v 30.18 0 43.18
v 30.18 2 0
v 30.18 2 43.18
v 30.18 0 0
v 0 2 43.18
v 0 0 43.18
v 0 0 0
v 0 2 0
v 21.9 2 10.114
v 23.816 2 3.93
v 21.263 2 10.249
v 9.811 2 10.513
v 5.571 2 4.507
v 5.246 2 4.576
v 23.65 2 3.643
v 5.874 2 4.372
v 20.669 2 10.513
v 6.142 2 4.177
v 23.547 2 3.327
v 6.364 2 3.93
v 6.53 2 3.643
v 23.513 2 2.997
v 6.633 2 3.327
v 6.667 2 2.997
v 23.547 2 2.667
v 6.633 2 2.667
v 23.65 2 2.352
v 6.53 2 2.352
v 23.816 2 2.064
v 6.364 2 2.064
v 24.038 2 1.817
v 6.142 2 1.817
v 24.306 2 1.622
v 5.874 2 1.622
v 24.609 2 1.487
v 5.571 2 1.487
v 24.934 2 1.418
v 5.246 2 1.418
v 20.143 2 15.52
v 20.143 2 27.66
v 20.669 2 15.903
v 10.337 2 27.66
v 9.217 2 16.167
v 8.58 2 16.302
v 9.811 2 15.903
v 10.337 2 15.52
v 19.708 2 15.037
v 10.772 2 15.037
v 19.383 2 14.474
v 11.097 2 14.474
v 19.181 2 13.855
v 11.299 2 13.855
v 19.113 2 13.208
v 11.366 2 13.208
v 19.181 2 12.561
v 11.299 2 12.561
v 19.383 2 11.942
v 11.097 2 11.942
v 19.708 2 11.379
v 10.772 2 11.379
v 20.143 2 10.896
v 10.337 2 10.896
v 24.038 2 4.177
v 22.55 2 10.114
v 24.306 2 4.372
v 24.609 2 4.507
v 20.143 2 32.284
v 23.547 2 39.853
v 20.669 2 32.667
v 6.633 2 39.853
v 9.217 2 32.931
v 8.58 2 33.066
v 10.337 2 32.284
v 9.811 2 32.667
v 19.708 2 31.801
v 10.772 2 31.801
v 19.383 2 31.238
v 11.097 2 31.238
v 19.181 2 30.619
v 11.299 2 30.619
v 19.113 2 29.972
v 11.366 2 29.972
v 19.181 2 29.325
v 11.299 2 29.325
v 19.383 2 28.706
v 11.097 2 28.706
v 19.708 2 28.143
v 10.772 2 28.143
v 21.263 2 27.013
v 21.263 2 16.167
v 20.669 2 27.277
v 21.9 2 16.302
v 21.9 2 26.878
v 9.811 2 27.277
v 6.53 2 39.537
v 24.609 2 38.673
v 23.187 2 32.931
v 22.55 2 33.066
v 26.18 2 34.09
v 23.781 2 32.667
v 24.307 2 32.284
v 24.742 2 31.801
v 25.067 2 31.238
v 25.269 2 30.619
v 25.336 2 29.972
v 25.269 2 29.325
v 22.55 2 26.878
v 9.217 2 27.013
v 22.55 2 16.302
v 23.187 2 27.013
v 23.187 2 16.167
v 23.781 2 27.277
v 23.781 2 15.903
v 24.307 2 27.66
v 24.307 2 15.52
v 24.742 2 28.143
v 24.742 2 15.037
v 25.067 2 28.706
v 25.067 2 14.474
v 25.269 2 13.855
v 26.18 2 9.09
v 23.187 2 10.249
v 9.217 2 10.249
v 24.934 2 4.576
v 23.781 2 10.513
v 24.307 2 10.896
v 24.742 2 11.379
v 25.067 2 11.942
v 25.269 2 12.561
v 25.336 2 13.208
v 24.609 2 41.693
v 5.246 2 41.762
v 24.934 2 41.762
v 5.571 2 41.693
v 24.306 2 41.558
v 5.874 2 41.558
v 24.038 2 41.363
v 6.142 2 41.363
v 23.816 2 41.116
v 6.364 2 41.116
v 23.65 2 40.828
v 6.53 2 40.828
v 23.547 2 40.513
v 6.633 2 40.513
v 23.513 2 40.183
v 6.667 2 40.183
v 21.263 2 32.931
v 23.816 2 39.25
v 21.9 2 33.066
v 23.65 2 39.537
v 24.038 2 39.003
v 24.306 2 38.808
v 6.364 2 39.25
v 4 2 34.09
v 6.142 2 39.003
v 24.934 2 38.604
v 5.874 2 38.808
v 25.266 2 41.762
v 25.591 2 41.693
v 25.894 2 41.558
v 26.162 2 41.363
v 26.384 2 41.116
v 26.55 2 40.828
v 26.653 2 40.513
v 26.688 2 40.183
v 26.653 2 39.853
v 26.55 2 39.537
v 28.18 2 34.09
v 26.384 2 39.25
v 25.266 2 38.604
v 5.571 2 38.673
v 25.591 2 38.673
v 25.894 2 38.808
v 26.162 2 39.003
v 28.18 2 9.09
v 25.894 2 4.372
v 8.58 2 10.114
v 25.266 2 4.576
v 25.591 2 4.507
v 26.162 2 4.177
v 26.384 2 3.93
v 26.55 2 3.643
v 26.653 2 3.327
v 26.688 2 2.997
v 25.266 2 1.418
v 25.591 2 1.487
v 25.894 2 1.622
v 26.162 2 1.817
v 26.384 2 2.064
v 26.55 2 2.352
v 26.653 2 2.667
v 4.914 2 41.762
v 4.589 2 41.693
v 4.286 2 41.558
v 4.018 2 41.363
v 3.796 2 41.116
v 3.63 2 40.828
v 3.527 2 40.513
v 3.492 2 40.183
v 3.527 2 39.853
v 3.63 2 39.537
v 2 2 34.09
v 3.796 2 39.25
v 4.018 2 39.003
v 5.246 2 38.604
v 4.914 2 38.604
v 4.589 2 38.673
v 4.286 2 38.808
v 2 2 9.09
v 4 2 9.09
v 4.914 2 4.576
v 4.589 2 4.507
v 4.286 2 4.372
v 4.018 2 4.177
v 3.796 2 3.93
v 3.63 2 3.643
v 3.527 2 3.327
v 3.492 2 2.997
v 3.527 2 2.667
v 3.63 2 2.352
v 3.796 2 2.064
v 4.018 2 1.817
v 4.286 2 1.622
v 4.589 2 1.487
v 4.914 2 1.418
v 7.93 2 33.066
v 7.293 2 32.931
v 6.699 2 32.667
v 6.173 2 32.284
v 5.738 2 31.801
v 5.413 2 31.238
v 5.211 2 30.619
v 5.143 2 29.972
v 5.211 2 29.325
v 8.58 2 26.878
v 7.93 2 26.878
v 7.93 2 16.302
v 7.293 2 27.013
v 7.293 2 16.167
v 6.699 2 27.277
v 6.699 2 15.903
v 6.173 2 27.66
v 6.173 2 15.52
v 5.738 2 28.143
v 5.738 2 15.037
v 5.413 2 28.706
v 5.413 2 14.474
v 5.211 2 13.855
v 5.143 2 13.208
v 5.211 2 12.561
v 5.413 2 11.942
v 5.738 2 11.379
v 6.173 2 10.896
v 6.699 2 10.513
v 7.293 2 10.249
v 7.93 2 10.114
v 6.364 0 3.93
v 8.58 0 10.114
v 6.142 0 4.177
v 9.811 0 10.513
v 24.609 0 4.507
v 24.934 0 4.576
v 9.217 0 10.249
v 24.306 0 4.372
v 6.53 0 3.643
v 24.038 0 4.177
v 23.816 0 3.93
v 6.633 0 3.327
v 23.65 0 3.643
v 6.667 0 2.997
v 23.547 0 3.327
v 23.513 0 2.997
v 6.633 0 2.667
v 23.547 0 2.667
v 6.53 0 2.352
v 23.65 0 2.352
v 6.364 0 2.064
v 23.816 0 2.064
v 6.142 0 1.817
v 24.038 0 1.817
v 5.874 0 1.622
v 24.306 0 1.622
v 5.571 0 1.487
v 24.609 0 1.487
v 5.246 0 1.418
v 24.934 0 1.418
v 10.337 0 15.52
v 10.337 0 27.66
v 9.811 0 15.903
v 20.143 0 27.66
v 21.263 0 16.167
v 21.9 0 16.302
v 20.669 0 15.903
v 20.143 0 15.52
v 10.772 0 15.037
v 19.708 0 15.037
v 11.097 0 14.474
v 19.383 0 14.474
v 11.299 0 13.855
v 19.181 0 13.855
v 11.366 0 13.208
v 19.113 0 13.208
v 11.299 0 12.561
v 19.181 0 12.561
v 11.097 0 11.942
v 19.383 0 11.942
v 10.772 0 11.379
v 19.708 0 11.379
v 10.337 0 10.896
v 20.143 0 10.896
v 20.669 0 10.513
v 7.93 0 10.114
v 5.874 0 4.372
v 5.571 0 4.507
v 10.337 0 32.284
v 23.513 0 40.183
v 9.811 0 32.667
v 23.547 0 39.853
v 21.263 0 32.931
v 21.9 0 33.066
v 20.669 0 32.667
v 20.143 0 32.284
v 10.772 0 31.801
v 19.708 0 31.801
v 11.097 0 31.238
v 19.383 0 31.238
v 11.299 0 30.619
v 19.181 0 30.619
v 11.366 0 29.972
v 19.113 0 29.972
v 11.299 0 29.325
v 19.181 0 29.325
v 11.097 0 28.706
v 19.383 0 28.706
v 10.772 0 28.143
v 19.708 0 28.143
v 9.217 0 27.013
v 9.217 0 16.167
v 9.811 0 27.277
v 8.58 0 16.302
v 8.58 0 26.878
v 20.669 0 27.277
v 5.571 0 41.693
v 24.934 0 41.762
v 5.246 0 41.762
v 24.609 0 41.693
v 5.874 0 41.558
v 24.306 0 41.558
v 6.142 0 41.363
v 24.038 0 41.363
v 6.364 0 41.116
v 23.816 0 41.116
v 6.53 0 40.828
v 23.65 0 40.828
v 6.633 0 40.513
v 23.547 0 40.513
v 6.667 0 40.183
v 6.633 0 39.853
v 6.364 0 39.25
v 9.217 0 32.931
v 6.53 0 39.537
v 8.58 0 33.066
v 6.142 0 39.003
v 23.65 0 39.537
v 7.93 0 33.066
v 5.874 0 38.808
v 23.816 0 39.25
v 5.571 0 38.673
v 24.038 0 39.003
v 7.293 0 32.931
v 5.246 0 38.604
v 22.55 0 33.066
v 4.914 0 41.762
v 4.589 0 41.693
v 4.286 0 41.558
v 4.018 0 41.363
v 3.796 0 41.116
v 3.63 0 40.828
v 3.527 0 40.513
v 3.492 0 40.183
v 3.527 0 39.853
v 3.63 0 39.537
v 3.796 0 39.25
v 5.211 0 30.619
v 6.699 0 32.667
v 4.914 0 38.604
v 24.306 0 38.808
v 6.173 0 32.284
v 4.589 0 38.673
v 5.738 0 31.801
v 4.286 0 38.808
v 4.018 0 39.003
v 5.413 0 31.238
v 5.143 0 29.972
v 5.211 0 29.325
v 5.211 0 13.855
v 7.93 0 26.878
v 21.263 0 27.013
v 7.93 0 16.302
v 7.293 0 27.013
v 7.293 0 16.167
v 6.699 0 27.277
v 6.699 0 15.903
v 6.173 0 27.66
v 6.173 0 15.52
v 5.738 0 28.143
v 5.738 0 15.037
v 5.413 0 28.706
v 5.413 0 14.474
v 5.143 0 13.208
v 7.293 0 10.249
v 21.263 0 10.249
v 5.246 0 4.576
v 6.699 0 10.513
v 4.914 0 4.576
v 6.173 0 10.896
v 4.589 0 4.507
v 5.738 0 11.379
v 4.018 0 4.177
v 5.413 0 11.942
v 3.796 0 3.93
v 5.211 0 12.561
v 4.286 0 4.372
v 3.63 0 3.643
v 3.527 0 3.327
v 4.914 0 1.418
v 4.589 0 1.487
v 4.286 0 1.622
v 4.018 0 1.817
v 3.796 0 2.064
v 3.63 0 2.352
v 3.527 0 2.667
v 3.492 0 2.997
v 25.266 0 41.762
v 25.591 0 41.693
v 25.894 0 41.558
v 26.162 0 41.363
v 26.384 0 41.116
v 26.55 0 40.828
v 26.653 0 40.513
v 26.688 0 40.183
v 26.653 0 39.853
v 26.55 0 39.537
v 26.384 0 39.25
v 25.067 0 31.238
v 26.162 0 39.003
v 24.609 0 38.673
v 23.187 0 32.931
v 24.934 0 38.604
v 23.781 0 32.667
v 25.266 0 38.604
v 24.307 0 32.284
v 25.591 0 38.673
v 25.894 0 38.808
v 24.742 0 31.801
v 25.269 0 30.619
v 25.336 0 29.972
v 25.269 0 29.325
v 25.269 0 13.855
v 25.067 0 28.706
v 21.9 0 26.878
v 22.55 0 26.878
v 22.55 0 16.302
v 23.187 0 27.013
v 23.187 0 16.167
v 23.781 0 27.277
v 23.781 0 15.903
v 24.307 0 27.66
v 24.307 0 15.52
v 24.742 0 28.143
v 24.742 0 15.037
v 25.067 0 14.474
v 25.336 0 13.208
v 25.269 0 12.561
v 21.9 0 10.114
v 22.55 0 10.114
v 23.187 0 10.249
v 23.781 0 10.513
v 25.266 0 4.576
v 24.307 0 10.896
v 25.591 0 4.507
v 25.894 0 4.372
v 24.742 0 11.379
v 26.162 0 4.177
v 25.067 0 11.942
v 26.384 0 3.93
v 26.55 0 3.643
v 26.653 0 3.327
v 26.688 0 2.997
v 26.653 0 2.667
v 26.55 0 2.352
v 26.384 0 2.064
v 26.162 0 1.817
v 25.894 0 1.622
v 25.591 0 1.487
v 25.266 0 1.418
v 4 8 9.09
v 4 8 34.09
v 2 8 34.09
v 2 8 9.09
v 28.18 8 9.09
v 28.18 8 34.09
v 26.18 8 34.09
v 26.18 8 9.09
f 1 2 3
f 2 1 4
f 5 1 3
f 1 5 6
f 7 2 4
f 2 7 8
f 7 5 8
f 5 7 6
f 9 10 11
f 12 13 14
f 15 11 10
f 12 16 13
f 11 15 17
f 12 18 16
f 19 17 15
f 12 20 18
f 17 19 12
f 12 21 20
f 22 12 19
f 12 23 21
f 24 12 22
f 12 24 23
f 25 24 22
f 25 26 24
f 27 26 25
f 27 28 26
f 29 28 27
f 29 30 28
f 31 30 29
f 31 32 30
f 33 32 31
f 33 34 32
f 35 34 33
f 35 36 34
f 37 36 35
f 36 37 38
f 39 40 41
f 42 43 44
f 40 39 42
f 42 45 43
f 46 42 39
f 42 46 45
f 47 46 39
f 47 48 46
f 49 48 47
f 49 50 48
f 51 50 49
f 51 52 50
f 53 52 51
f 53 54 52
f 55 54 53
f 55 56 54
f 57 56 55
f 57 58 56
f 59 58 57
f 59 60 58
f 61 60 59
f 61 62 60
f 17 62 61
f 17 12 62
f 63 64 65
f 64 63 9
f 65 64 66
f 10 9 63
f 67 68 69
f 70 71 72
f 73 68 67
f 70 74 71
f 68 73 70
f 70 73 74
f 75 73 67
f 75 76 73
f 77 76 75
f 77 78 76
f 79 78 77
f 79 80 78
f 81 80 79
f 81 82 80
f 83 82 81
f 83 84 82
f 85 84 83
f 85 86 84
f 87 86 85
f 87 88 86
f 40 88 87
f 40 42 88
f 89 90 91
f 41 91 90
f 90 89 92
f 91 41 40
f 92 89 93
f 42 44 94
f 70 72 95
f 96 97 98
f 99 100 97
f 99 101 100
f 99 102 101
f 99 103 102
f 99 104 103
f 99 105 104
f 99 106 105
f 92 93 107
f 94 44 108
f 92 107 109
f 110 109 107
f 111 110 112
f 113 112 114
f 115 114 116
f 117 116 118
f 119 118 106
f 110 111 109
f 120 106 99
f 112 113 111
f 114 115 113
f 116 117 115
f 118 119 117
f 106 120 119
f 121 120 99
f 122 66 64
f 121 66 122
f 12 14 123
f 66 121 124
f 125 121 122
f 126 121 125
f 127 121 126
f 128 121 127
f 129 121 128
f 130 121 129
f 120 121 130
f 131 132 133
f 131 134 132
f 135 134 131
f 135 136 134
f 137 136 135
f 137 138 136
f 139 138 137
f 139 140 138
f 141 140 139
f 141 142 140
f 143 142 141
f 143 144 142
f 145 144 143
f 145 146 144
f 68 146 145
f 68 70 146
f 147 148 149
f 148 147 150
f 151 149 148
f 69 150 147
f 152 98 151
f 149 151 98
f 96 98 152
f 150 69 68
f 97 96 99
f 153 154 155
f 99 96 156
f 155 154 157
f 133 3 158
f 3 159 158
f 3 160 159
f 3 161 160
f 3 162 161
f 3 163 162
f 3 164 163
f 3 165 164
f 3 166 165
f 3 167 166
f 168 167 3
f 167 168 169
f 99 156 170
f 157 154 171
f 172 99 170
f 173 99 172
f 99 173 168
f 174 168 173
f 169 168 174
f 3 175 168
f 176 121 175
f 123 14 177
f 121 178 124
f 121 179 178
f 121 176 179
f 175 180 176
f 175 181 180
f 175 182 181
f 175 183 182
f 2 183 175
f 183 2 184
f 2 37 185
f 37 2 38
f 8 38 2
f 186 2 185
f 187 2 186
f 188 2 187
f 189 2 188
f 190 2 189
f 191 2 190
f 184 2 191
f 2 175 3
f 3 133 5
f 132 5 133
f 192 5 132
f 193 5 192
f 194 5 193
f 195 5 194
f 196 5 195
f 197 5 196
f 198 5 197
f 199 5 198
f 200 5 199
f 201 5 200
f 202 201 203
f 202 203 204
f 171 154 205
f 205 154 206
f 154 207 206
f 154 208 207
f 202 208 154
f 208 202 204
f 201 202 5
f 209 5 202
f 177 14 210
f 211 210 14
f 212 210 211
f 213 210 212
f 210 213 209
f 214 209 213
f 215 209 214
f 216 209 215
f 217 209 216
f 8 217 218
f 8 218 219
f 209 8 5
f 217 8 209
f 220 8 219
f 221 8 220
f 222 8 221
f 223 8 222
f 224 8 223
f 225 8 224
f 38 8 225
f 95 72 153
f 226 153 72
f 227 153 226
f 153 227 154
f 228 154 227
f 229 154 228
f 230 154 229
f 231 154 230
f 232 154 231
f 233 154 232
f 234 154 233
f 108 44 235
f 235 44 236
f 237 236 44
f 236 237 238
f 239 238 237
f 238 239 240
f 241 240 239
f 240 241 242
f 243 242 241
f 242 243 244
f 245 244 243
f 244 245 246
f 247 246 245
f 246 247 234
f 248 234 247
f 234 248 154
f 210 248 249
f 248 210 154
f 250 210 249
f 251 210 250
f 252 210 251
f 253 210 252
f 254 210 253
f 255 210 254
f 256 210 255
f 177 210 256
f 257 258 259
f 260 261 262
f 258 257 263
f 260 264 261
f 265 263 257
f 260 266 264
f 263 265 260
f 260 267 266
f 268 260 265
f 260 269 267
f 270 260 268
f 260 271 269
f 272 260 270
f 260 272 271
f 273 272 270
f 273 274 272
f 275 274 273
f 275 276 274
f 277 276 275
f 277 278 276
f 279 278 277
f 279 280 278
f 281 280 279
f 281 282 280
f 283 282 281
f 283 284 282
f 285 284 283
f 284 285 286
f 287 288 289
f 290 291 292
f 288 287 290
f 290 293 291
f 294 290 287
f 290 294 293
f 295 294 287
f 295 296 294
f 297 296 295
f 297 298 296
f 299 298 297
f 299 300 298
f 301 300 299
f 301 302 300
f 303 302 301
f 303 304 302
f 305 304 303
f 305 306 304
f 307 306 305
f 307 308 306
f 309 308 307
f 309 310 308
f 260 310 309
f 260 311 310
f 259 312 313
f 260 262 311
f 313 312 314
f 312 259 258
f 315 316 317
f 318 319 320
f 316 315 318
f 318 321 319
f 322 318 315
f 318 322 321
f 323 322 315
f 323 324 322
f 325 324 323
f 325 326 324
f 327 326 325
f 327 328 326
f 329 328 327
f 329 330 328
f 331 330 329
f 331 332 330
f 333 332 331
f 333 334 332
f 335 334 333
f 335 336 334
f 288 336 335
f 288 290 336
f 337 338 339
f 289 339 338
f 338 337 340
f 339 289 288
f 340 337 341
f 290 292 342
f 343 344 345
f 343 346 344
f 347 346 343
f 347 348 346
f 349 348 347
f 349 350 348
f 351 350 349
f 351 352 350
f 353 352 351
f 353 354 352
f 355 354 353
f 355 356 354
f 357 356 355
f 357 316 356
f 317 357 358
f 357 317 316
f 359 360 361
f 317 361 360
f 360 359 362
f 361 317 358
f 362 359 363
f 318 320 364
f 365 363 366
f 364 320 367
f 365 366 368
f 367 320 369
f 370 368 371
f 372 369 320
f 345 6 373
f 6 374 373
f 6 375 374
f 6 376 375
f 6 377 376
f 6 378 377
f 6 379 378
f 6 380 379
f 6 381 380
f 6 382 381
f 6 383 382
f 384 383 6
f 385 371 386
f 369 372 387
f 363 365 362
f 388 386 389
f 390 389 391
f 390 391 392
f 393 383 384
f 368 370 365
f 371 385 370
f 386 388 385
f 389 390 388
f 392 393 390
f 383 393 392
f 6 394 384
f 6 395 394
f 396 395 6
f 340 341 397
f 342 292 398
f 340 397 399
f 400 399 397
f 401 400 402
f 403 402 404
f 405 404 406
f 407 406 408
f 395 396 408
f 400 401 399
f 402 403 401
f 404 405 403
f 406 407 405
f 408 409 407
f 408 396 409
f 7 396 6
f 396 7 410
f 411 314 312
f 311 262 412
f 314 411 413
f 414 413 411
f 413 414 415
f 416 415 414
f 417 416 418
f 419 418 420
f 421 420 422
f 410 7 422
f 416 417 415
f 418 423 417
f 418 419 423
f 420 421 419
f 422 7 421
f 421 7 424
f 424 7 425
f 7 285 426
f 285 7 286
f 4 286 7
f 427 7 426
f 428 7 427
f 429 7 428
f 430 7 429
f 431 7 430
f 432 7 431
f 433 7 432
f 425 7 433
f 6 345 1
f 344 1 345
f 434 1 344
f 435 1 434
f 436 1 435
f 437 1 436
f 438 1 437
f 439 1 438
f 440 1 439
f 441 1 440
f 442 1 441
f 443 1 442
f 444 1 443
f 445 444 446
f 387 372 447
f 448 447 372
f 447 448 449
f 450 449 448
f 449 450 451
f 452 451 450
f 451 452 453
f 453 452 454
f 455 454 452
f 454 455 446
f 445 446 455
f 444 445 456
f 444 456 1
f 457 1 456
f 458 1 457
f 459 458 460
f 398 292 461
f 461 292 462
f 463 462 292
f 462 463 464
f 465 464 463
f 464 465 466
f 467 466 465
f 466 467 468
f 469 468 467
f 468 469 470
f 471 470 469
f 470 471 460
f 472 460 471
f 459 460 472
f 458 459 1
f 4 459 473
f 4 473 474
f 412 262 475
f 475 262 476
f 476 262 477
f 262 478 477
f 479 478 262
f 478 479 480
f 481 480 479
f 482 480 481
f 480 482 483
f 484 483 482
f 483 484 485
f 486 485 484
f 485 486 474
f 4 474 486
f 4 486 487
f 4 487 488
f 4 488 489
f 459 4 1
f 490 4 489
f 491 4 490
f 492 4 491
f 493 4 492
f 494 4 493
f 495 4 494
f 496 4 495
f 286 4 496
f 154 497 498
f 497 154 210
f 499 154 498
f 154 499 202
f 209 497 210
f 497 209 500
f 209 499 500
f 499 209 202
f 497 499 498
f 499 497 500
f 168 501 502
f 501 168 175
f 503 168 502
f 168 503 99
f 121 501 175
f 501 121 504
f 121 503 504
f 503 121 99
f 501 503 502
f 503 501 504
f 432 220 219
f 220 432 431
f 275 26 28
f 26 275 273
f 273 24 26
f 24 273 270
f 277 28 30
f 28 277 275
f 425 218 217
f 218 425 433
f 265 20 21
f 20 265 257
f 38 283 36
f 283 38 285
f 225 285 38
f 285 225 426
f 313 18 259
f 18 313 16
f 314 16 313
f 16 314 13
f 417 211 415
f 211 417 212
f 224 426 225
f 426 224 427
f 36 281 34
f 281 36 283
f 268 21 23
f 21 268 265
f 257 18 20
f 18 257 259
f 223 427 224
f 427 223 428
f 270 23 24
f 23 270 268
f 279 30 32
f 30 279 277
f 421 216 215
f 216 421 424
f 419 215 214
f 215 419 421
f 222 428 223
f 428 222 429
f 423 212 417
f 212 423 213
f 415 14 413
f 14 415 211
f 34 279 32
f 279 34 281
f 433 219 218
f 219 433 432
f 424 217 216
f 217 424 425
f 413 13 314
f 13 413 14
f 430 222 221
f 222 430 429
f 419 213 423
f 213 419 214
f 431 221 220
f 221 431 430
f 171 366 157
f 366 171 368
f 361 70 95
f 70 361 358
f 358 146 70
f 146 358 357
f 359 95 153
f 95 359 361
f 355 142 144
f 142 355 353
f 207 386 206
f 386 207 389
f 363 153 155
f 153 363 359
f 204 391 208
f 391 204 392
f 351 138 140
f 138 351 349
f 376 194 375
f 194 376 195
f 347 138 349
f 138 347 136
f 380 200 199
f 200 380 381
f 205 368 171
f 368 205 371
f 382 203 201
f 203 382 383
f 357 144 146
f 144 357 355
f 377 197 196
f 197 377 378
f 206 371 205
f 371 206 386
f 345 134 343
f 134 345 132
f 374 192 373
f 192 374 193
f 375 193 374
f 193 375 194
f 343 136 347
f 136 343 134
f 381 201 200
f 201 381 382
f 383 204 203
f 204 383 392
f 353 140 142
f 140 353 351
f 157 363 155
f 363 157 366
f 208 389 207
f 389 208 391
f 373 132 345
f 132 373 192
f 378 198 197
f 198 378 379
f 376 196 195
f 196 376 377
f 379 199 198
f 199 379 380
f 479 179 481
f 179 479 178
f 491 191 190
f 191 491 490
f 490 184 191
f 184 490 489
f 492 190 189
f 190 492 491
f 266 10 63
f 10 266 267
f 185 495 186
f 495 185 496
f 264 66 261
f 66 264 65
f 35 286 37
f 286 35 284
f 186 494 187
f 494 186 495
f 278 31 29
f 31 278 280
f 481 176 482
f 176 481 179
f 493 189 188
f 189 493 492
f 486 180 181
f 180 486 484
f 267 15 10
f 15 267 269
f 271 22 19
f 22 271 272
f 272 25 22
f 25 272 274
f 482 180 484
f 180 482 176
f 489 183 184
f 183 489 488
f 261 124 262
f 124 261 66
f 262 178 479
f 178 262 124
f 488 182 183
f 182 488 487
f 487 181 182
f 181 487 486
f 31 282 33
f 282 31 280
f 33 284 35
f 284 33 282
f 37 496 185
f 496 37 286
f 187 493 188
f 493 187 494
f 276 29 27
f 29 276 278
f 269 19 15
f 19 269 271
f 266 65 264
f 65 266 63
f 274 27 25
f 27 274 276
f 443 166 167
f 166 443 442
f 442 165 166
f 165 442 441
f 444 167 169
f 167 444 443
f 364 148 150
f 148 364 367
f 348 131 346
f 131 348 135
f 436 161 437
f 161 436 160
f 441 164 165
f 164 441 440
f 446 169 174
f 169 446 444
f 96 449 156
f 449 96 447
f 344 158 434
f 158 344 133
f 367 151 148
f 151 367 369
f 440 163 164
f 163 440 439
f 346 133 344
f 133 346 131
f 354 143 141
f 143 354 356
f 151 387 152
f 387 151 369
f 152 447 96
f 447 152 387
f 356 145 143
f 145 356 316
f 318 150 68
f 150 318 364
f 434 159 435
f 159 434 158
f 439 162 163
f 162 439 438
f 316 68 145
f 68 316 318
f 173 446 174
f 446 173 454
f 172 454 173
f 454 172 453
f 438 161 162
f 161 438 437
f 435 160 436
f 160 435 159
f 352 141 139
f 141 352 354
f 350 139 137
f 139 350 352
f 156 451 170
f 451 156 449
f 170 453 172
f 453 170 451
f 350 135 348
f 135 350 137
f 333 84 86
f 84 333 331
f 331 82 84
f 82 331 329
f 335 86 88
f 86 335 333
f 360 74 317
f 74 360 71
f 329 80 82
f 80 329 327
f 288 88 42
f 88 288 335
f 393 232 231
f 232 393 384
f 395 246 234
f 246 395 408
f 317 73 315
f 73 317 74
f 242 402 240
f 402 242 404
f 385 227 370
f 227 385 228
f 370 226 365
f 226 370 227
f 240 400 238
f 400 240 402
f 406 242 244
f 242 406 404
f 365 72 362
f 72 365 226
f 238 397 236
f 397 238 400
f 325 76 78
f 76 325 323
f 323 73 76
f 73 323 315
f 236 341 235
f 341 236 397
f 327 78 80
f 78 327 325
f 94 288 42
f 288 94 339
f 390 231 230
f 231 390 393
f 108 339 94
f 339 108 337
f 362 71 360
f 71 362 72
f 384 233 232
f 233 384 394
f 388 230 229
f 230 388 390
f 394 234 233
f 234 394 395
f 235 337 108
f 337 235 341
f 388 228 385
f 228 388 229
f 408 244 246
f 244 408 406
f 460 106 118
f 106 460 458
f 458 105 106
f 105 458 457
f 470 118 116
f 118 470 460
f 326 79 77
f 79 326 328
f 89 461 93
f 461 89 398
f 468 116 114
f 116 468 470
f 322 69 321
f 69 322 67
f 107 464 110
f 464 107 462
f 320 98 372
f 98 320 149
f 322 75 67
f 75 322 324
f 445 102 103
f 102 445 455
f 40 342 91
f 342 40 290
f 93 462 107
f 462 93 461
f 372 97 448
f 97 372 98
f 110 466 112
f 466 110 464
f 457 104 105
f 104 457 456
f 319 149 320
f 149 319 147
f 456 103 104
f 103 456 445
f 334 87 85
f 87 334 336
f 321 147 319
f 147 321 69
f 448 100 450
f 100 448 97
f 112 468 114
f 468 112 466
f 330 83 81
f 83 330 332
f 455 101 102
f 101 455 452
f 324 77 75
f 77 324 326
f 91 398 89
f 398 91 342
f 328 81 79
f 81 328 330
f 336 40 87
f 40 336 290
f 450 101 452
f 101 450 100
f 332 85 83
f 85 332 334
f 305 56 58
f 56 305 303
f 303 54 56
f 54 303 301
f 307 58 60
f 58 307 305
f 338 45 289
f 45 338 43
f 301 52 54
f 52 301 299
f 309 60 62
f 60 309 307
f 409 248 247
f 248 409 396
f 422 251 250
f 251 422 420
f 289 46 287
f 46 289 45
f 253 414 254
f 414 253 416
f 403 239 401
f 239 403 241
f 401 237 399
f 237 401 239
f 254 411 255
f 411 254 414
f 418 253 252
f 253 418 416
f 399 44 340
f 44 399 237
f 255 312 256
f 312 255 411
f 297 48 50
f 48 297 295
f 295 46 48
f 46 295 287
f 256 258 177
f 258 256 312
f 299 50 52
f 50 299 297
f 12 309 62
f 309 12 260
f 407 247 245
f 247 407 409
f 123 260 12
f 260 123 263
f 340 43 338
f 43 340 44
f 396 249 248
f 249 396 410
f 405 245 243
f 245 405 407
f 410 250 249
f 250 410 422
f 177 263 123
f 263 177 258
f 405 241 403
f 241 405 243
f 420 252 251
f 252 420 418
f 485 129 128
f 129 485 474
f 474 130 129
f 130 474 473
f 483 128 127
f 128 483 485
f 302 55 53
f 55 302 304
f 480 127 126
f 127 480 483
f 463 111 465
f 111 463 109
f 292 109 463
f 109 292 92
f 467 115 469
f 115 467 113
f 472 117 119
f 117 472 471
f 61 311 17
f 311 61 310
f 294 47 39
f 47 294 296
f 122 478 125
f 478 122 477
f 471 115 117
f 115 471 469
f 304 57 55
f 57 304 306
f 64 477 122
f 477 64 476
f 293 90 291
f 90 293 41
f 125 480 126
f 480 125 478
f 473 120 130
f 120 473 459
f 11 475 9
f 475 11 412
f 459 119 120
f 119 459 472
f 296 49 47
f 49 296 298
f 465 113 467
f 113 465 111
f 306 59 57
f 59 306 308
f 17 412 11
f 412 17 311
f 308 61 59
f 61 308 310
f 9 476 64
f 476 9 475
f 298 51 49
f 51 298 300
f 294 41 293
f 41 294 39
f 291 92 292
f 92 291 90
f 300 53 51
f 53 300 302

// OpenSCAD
// file: tile_common.scad
/*
Common modules and functions for 1U Tiles
*/

function inches( x) = x * 25.4; // convert inches to mm

// put a hole in the tile of diameter 'd' at position 'x','z'
module hole( x, z, d) {
    translate([x, 0, z])
        rotate([270,0,0])
            cylinder(r=(d / 2), h=10, center=true);
}
// file: blank_tile.scad
hp = 6; // width in hole points
plate_height = 1.7 * 25.4; // spec is 1.7"
plate_width = hp * 5.08 - 0.3; // general conversion factor with fudge for tolerance

module front_face() {
    thickness = 2; // thickness of PCB front panels
    cube([plate_width, thickness, plate_height], center=false);
}

rib_width = 2;
rib_inset = 2;
rib_height = 25; // max physically measured at 29.06
rib_depth = 8;
module left_stiffening_rib() {
    translate([rib_inset, 0, ((plate_height - rib_height) / 2)]){
        cube([rib_width, rib_depth, rib_height], center=false);
    }
}

module right_stiffening_rib() {
    translate([((plate_width - rib_width) - rib_inset), 0, ((plate_height - rib_height) / 2)]){
        cube([rib_width, rib_depth, rib_height], center=false);
    }
}

module material() {
    union() {
        front_face();
        left_stiffening_rib();
        right_stiffening_rib();
    }
}

module mounting_holes() {
    // make round shapes more fine
    $fs = 0.1;

    mounting_hole_dia = 0.125 * 25.4; // spec 0.125"
    hole_horiz_offset = 0.2 * 25.4; // spec 0.200"
    hole_vert_offset = 0.118 * 25.4; // spec 0.118"

    module hole_pair(h_offset) {
        translate([h_offset, 0, hole_vert_offset])
            rotate([270,0,0])
                cylinder(r=mounting_hole_dia / 2, h=10, center=true);
        
        translate([h_offset, 0, plate_height - hole_vert_offset])
            rotate([270,0,0])
                cylinder(r=mounting_hole_dia / 2, h=10, center=true);
    }
    hole_pair(hole_horiz_offset);
    hole_pair(plate_width - hole_horiz_offset);
}

module cutouts() {
    mounting_holes();
}
module blank_tile() {
    difference() {
        material();
        cutouts();
    }
}

blank_tile();
// main file
/*
A Pulp Logic compatible 1U with cutouts to mount four jacks.

based on the "4 Jacks" example given here
http://pulplogic.com/1u_tiles/

units: millimeters
*/

use <blank_tile.scad>
use <tile_common.scad>

module cutouts() {
    $fs=0.01; // make cylinder curves more fine

    // top-left jack
    hole(x=inches(0.325), z=inches(1.180), d=inches(0.245));

    // top-right jack
    hole(x=inches(0.875), z=inches(1.180), d=inches(0.245));
    
    // bottom-left jack
    hole(x=inches(0.325), z=inches(0.520), d=inches(0.245));

    // bottom-right jack
    hole(x=inches(0.875), z=inches(0.520), d=inches(0.245));
}

module one_pot_two_jacks() {
    difference() {
        blank_tile();
        cutouts();
    }
}

one_pot_two_jacks();
